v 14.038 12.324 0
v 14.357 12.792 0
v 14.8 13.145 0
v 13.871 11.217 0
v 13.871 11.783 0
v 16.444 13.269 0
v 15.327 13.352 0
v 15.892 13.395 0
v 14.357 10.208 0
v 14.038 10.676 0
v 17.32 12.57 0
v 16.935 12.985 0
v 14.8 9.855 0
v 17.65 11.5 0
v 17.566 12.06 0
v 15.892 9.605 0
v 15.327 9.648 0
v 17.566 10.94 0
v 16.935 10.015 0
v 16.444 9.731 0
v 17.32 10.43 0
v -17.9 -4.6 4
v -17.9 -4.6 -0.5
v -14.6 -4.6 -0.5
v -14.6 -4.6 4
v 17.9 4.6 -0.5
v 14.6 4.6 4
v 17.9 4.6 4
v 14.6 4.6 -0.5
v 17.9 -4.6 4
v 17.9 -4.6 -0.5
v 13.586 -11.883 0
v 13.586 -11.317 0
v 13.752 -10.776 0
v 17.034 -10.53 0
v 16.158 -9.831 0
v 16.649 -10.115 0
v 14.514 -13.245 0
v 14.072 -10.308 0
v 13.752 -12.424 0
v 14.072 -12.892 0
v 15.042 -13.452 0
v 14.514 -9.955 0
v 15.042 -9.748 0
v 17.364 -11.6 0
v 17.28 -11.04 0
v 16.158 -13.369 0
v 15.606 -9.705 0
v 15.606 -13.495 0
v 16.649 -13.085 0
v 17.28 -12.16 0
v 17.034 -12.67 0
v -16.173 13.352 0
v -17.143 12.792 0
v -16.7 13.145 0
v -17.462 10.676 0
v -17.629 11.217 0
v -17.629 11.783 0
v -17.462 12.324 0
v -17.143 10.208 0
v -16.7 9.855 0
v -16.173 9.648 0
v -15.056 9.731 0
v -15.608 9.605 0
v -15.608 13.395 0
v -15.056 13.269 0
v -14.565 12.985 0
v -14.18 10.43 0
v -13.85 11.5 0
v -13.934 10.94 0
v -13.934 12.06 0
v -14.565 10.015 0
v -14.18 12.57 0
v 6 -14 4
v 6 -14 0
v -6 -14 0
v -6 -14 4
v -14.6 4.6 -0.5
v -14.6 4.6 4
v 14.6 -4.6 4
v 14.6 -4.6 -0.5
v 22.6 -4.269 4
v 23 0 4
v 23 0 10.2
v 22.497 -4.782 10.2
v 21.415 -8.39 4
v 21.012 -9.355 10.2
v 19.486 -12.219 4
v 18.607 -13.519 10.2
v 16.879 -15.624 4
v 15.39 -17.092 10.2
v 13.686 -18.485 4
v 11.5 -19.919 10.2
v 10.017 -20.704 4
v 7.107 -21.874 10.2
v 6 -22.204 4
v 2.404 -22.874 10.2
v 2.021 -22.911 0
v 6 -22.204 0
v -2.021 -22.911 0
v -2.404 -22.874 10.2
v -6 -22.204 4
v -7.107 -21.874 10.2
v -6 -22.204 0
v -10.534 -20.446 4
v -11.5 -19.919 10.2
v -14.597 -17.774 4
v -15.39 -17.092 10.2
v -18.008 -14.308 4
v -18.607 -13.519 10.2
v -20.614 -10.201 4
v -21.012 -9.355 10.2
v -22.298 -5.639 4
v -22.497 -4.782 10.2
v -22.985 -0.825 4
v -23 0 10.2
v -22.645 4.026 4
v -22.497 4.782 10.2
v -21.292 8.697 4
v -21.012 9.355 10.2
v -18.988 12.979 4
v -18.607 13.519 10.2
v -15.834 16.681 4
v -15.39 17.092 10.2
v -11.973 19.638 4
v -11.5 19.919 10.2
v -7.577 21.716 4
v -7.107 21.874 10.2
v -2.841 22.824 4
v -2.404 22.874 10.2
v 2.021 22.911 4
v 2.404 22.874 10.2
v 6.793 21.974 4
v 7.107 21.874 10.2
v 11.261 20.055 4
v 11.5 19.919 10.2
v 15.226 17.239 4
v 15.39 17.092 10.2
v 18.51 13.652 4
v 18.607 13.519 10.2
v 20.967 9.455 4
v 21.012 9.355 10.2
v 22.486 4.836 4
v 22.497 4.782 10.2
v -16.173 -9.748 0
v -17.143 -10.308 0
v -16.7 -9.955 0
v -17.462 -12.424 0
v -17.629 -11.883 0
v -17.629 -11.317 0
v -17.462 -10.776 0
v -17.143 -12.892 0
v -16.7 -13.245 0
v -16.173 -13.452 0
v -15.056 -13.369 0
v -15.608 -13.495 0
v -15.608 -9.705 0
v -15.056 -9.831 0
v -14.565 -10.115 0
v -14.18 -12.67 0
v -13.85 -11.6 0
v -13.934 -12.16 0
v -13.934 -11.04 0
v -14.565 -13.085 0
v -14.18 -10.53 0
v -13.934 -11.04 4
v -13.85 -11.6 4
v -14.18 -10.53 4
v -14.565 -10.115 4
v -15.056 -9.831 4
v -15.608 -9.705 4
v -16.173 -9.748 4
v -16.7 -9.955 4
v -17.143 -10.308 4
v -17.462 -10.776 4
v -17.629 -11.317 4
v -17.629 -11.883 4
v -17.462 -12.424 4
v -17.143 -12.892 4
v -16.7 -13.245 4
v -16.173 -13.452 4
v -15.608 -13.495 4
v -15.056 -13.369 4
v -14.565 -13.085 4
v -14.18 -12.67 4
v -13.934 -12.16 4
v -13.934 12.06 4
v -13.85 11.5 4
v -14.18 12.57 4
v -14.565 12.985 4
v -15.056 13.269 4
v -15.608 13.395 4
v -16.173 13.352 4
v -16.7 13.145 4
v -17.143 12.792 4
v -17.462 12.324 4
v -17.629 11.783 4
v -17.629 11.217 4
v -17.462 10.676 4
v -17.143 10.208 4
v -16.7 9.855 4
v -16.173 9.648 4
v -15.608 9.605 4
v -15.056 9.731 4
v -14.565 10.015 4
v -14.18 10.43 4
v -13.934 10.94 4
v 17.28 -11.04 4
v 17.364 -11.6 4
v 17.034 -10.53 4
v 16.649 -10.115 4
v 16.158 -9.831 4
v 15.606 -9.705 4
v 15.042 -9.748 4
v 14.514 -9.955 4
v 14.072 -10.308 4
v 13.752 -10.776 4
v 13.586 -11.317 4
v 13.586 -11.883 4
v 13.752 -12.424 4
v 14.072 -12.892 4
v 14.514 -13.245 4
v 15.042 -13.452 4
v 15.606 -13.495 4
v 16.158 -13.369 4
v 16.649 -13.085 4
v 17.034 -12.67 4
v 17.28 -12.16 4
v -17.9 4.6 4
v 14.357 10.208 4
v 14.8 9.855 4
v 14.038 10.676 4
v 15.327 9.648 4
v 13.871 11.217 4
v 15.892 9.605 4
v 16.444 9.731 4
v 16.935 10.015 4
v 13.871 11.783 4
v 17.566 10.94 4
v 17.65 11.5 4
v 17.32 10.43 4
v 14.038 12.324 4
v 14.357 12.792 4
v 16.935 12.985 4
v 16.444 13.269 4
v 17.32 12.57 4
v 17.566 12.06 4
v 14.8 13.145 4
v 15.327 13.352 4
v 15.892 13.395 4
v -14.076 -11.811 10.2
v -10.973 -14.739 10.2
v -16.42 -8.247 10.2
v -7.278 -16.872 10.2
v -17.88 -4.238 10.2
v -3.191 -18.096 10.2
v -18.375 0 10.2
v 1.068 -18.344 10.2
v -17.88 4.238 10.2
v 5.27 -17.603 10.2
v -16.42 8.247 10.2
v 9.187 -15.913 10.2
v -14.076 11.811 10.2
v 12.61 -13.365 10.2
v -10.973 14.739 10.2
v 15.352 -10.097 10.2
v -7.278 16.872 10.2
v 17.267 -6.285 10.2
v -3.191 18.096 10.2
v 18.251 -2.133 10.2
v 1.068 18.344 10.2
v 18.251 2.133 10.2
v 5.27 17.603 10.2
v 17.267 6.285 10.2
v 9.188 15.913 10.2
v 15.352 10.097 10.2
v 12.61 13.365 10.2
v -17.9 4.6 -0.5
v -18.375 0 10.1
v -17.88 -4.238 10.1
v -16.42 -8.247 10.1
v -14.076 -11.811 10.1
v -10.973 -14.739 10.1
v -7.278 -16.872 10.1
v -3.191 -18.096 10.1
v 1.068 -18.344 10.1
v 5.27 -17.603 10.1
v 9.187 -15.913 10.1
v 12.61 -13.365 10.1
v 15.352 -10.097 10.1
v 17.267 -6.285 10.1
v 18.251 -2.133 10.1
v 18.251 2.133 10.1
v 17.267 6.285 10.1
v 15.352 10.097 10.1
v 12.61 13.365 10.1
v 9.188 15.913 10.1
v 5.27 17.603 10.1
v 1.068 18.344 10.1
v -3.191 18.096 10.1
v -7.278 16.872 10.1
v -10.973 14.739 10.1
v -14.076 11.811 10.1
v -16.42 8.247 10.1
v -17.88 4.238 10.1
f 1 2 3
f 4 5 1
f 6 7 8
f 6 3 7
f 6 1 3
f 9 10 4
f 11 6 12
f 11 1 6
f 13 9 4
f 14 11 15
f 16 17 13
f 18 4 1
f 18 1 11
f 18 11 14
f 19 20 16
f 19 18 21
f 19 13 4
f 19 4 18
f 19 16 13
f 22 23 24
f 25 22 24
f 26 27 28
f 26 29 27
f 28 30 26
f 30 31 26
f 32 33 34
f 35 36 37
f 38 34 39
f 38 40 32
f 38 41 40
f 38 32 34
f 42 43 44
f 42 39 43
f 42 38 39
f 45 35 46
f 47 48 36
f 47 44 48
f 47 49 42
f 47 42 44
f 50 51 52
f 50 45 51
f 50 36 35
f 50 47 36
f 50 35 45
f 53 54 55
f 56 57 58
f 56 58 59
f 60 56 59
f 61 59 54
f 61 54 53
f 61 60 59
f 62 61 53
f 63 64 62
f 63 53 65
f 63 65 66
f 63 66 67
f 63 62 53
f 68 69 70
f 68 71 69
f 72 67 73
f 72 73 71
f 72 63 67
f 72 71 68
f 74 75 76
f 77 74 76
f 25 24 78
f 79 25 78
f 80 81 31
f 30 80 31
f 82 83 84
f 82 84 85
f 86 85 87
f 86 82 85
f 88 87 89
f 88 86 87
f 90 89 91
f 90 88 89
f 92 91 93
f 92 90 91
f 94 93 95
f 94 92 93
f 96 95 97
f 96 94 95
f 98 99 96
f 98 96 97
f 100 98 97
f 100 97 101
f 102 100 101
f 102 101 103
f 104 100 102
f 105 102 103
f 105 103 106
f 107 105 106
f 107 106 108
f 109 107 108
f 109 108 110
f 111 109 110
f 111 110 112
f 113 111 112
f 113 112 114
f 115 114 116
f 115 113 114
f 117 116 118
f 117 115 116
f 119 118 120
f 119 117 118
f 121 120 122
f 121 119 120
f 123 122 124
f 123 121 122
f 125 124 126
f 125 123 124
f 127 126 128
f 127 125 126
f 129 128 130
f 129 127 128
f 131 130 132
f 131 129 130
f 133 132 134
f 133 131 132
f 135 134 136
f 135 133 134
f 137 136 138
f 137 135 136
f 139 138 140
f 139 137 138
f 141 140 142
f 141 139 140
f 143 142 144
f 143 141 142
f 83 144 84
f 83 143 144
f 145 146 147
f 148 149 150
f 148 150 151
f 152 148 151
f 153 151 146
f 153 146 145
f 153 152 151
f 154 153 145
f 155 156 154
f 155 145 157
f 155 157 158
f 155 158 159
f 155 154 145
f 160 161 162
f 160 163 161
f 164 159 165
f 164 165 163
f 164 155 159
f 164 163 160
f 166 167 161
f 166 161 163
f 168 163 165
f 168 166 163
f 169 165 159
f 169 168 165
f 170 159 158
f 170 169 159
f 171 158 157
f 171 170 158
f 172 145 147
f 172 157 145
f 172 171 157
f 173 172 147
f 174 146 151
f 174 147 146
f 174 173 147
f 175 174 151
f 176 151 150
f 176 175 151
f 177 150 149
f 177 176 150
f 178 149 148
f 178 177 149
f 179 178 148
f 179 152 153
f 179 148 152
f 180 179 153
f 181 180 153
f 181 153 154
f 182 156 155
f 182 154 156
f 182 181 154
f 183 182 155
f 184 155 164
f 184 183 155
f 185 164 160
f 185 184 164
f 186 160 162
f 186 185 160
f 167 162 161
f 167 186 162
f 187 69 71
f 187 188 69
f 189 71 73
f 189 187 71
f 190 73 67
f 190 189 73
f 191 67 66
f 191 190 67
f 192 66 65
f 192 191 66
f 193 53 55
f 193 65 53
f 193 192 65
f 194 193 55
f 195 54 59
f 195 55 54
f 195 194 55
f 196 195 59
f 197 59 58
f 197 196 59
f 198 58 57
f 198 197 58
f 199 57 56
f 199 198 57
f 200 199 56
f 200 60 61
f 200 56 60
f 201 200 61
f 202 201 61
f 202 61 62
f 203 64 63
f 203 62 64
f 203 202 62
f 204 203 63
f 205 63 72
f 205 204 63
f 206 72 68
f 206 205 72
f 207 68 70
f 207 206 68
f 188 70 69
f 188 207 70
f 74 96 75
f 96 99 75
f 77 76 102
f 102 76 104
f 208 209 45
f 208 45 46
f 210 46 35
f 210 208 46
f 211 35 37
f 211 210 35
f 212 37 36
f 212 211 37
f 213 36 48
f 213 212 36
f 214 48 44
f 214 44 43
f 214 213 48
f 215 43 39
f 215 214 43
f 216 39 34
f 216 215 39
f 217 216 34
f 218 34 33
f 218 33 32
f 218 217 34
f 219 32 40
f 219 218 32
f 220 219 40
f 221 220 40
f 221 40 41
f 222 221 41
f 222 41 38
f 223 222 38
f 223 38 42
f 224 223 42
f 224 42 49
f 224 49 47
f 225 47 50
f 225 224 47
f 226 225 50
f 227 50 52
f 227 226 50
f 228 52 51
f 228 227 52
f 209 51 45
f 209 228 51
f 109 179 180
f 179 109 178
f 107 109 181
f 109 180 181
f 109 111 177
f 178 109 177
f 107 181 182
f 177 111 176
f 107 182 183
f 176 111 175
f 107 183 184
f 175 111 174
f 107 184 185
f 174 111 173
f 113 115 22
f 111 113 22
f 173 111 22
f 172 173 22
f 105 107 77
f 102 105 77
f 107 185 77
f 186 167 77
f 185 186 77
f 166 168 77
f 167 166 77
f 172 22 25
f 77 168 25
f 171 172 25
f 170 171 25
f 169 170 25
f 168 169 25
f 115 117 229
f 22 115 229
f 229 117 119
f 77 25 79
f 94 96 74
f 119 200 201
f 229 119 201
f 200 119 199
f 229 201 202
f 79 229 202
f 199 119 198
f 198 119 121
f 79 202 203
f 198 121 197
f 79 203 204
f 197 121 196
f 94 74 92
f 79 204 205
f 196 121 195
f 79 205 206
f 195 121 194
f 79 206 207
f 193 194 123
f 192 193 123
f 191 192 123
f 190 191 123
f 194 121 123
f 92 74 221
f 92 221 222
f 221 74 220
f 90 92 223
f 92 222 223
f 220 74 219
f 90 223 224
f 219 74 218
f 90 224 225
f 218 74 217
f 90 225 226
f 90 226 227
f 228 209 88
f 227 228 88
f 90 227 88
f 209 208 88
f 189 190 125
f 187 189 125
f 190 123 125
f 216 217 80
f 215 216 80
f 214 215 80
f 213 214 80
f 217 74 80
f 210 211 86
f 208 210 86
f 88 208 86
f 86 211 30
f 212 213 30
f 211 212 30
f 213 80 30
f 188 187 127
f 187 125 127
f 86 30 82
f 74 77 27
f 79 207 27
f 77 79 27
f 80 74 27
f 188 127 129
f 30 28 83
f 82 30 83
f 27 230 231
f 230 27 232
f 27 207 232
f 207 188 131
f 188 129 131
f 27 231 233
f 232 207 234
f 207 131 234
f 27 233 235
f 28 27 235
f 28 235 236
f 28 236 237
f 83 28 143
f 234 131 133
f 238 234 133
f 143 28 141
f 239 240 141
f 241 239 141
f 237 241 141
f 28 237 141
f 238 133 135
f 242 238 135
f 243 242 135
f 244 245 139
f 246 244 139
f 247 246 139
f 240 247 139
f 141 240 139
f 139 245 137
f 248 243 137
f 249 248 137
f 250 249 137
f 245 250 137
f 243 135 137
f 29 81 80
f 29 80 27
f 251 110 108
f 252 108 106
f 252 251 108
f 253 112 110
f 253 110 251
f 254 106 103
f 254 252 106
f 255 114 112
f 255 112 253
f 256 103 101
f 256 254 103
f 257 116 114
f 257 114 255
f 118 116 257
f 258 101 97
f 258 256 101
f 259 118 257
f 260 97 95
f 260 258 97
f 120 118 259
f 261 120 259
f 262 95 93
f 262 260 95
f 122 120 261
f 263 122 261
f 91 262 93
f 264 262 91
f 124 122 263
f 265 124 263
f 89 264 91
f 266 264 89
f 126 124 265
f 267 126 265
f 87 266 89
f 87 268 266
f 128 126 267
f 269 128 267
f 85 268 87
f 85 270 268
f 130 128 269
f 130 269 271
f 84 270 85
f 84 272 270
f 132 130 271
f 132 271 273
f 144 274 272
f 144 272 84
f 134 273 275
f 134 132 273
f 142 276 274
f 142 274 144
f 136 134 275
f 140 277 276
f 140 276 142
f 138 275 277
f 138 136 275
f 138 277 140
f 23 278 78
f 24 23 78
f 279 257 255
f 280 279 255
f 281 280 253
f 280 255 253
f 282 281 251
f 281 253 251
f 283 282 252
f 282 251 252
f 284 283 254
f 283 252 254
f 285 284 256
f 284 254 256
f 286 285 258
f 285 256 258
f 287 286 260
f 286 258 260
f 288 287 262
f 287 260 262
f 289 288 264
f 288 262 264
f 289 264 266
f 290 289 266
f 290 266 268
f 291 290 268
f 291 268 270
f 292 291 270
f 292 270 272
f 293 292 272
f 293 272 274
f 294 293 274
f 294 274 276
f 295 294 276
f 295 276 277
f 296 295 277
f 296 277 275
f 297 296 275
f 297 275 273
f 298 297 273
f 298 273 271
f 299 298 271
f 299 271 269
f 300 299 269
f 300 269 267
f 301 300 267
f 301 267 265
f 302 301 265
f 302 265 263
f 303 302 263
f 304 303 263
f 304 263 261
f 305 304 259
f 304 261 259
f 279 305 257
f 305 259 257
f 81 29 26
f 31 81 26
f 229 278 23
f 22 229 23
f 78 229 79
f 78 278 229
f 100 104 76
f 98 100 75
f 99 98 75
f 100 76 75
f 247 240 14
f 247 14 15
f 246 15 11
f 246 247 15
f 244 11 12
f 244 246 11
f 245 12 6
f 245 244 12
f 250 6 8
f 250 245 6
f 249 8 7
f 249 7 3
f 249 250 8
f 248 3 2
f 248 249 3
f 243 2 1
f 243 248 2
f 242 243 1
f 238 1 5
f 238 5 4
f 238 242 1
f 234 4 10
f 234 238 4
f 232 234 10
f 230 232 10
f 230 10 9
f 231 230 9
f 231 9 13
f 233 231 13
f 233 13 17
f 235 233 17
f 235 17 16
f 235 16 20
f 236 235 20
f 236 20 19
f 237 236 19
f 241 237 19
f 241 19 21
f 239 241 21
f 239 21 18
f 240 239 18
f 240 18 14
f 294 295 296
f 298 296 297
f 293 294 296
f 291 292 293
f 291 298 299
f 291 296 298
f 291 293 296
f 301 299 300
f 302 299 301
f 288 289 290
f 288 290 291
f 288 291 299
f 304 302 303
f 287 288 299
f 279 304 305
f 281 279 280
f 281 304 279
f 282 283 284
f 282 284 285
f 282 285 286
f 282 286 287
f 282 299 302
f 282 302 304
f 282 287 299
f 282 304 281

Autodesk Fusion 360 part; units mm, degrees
sketch "Sketch1" plane through (0, 0, 0) normal (0, 0, 1) x (1, 0, 0)
  circle A0 centre (0, 0) radius 23
  dimension "d1" = 46
extrude "Extrude1" add sketch "Sketch1" along normal blind 10.2
sketch "Sketch2" plane through (0, 0, 0) normal (0, 0, 1) x (1, 0, 0)
  line L0 (-16.25, 4.6) -> (-14.6, 4.6)
  line L1 (-14.6, 4.6) -> (-17.9, 4.6)
  line L2 (-17.9, 4.6) -> (-17.9, -4.6)
  line L3 (-17.9, -4.6) -> (-14.6, -4.6)
  line L4 (-14.6, -4.6) -> (-14.6, 4.6)
  line L5 (14.6, 0) -> (14.6, 4.6)
  line L6 (14.6, 4.6) -> (17.9, 4.6)
  line L7 (17.9, 4.6) -> (14.6, 4.6)
  line L8 (14.6, 4.6) -> (14.6, -4.6)
  line L9 (14.6, -4.6) -> (17.9, -4.6)
  line L10 (17.9, -4.6) -> (17.9, 4.6)
  dimension "d6" = 1.65
  dimension "d7" = 3.3
  dimension "d8" = 9.2
  dimension "d10" = 14.6
  dimension "d11" = 3.3
  dimension "d12" = 3.3
  dimension "d13" = 9.2
extrude "Extrude2" add sketch "Sketch2" against normal blind 0.3
sketch "Sketch5" plane through (0, 0, 0) normal (0, 0, -1) x (1, 0, 0)
  line L0 (-14.6, -4.6) -> (-17.9, -4.6)
  line L1 (-17.9, -4.6) -> (-17.9, 4.6)
  line L2 (-17.9, 4.6) -> (-14.6, 4.6)
  line L3 (-14.6, 4.6) -> (-14.6, -4.6)
  line L4 (17.9, -4.6) -> (14.6, -4.6)
  line L5 (14.6, -4.6) -> (14.6, 4.6)
  line L6 (14.6, 4.6) -> (17.9, 4.6)
  line L7 (17.9, 4.6) -> (17.9, -4.6)
  circle A0 centre (0, 0) radius 23
  circle A1 centre (0, 0) radius 23
  line L8 (-17.9, 4.6) -> (-14.6, 4.6)
  line L9 (-14.6, 4.6) -> (-14.6, -4.6)
  line L10 (-14.6, -4.6) -> (-17.9, -4.6)
  line L11 (-17.9, -4.6) -> (-17.9, 4.6)
  line L12 (14.6, 4.6) -> (17.9, 4.6)
  line L13 (17.9, 4.6) -> (17.9, -4.6)
  line L14 (17.9, -4.6) -> (14.6, -4.6)
  line L15 (14.6, -4.6) -> (14.6, 4.6)
extrude "Extrude3" cut 1 faces at (-0.5729, -10.7119, 0) along direction (0, 0, 1) blind 4
sketch "Sketch6" plane through (0, 0, 4) normal (0, 0, -1) x (1, 0, 0)
  line L0 (-14.6, -4.6) -> (-17.9, -4.6)
  line L1 (-17.9, -4.6) -> (-17.9, 4.6)
  line L2 (-17.9, 4.6) -> (-14.6, 4.6)
  line L3 (-14.6, 4.6) -> (-14.6, -4.6)
  line L4 (17.9, -4.6) -> (14.6, -4.6)
  line L5 (14.6, -4.6) -> (14.6, 4.6)
  line L6 (14.6, 4.6) -> (17.9, 4.6)
  line L7 (17.9, 4.6) -> (17.9, -4.6)
  circle A0 centre (0, 0) radius 23
  line L8 (0, 0) -> (0, 11.6)
  line L9 (0, 0) -> (0, -11.5)
  line L10 (0, 11.6) -> (-15.75, 11.6)
  line L11 (0, 11.6) -> (15.75, 11.6)
  line L12 (0, -11.5) -> (15.75, -11.5)
  line L13 (0, -11.5) -> (-15.75, -11.5)
  circle A1 centre (-15.75, 11.6) radius 1.9
  circle A2 centre (15.4643, 11.6) radius 1.9
  circle A3 centre (-15.75, -11.5) radius 1.9
  circle A4 centre (15.75, -11.5) radius 1.9
  dimension "d18" = 11.6
  dimension "d19" = 11.5
  dimension "d20" = 15.75
  dimension "d21" = 15.75
  dimension "d22" = 15.75
  dimension "d23" = 15.75
  dimension "d24" = 3.8
  dimension "d25" = 3.8
  dimension "d26" = 3.8
  dimension "d27" = 3.8
extrude "Extrude4" add sketch "Sketch6" along normal blind 4 contours A1 | A2 | A4 | A3
extrude "Extrude5" add 2 faces at (-15.7, -1.5333, -0.3) (15.7, 1.5333, -0.3) along direction (0, 0, -1) blind 0.2
sketch "Sketch7" plane through (0, 0, 0) normal (0, 1, 0) x (1, 0, 0)
sketch "Sketch8" plane through (0, 0, 0) normal (0, 0, 1) x (1, 0, 0)
  line L0 (0, 0) -> (15, 0)
  line L1 (15, 0) -> (15, 15.5)
  line L2 (15, 15.5) -> (0, 15.5)
  line L3 (0, 15.5) -> (0, 0)
  dimension "d32" = 15
  dimension "d33" = 15.5
sketch "Sketch9" plane through (0, 0, -0.5) normal (0, 0, -1) x (1, 0, 0)
  line L0 (17.9, -4.6) -> (17.9, 4.6)
  line L1 (17.9, 4.6) -> (14.6, 4.6)
  line L2 (14.6, 4.6) -> (14.6, -4.6)
  line L3 (14.6, -4.6) -> (17.9, -4.6)
  line L4 (15, -15.5) -> (-15, -15.5)
  line L5 (-15, -15.5) -> (-15, 15.5)
  line L6 (-15, 15.5) -> (15, 15.5)
  line L7 (15, 15.5) -> (15, -15.5)
  line L8 (0, 0) -> (16, 0)
  dimension "d34" = 30
  dimension "d35" = 31
sketch "Sketch10" plane through (0, 0, 0) normal (0, 0, 1) x (1, 0, 0)
  line L0 (0, -23) -> (6, -23)
  line L1 (6, -23) -> (6, -14)
  line L2 (6, -14) -> (0, -14)
  line L3 (0, -14) -> (0, -23)
  line L4 (6, -14) -> (-6, -14)
  line L5 (-6, -14) -> (-6, -23)
  line L6 (-6, -23) -> (6, -23)
  line L7 (6, -23) -> (6, -14)
  circle A0 centre (0, 0) radius 23
  dimension "d36" = 6
  dimension "d37" = 12
extrude "Extrude6" add sketch "Sketch10" along normal blind 4 contours L3 L4 L5 A0 | L1 L2 L3 L4 L7 A0
sketch "Sketch11" plane through (0, 0, -0.5) normal (0, 0, -1) x (1, 0, 0)
  line L0 (0, 23) -> (0, 15.5)
sketch "Sketch12" plane through (0, 0, 0) normal (1, 0, 0) x (0, 1, 0)
sketch "Sketch13" plane through (0, 0, -0.5) normal (0, 0, -1) x (1, 0, 0)
  line L0 (0, 0) -> (-14.6, 0)
  line L1 (-14.6, 0) -> (-17.9, 0)
  line L2 (-14.6, 4.6) -> (-17.9, 4.6)
  line L3 (-17.9, 4.6) -> (-17.9, -4.6)
  line L4 (-17.9, -4.6) -> (-14.6, -4.6)
  line L5 (-14.6, -4.6) -> (-14.6, 4.6)
sketch "Sketch14" plane through (17.9, 0, 0) normal (1, 0, 0) x (0, 1, 0)
  line L0 (-4.6, 4) -> (-4.6, -0.5)
  line L1 (-4.6, -0.5) -> (4.6, -0.5)
  line L2 (4.6, -0.5) -> (4.6, 4)
  line L3 (4.6, 4) -> (-4.6, 4)
ref_plane "WorkPlane1" through (0, 0, 0) normal (1, 0, 0) x (0, 1, 0)
ref_plane "WorkPlane2" through (0, 0, 0) normal (0, 1, 0) x (0, 0, 1)
sketch "Sketch15" plane through (0, 0, 10.2) normal (0, 0, 1) x (-1, 0, 0)
  circle A0 centre (0, 0) radius 23
  circle A1 centre (0, 0) radius 18.375
  dimension "d42" = 36.75
extrude "Extrude7" cut sketch "Sketch15" against normal blind 0.1 contours A1
equation "d6 = ( 3.3 / 2 ) * 1 mm"
equation "d20 = ( 31.5 / 2 ) * 1 mm"
equation "d21 = ( 31.5 / 2 ) * 1 mm"
equation "d22 = ( 31.5 / 2 ) * 1 mm"
equation "d23 = ( 31.5 / 2 ) * 1 mm"
